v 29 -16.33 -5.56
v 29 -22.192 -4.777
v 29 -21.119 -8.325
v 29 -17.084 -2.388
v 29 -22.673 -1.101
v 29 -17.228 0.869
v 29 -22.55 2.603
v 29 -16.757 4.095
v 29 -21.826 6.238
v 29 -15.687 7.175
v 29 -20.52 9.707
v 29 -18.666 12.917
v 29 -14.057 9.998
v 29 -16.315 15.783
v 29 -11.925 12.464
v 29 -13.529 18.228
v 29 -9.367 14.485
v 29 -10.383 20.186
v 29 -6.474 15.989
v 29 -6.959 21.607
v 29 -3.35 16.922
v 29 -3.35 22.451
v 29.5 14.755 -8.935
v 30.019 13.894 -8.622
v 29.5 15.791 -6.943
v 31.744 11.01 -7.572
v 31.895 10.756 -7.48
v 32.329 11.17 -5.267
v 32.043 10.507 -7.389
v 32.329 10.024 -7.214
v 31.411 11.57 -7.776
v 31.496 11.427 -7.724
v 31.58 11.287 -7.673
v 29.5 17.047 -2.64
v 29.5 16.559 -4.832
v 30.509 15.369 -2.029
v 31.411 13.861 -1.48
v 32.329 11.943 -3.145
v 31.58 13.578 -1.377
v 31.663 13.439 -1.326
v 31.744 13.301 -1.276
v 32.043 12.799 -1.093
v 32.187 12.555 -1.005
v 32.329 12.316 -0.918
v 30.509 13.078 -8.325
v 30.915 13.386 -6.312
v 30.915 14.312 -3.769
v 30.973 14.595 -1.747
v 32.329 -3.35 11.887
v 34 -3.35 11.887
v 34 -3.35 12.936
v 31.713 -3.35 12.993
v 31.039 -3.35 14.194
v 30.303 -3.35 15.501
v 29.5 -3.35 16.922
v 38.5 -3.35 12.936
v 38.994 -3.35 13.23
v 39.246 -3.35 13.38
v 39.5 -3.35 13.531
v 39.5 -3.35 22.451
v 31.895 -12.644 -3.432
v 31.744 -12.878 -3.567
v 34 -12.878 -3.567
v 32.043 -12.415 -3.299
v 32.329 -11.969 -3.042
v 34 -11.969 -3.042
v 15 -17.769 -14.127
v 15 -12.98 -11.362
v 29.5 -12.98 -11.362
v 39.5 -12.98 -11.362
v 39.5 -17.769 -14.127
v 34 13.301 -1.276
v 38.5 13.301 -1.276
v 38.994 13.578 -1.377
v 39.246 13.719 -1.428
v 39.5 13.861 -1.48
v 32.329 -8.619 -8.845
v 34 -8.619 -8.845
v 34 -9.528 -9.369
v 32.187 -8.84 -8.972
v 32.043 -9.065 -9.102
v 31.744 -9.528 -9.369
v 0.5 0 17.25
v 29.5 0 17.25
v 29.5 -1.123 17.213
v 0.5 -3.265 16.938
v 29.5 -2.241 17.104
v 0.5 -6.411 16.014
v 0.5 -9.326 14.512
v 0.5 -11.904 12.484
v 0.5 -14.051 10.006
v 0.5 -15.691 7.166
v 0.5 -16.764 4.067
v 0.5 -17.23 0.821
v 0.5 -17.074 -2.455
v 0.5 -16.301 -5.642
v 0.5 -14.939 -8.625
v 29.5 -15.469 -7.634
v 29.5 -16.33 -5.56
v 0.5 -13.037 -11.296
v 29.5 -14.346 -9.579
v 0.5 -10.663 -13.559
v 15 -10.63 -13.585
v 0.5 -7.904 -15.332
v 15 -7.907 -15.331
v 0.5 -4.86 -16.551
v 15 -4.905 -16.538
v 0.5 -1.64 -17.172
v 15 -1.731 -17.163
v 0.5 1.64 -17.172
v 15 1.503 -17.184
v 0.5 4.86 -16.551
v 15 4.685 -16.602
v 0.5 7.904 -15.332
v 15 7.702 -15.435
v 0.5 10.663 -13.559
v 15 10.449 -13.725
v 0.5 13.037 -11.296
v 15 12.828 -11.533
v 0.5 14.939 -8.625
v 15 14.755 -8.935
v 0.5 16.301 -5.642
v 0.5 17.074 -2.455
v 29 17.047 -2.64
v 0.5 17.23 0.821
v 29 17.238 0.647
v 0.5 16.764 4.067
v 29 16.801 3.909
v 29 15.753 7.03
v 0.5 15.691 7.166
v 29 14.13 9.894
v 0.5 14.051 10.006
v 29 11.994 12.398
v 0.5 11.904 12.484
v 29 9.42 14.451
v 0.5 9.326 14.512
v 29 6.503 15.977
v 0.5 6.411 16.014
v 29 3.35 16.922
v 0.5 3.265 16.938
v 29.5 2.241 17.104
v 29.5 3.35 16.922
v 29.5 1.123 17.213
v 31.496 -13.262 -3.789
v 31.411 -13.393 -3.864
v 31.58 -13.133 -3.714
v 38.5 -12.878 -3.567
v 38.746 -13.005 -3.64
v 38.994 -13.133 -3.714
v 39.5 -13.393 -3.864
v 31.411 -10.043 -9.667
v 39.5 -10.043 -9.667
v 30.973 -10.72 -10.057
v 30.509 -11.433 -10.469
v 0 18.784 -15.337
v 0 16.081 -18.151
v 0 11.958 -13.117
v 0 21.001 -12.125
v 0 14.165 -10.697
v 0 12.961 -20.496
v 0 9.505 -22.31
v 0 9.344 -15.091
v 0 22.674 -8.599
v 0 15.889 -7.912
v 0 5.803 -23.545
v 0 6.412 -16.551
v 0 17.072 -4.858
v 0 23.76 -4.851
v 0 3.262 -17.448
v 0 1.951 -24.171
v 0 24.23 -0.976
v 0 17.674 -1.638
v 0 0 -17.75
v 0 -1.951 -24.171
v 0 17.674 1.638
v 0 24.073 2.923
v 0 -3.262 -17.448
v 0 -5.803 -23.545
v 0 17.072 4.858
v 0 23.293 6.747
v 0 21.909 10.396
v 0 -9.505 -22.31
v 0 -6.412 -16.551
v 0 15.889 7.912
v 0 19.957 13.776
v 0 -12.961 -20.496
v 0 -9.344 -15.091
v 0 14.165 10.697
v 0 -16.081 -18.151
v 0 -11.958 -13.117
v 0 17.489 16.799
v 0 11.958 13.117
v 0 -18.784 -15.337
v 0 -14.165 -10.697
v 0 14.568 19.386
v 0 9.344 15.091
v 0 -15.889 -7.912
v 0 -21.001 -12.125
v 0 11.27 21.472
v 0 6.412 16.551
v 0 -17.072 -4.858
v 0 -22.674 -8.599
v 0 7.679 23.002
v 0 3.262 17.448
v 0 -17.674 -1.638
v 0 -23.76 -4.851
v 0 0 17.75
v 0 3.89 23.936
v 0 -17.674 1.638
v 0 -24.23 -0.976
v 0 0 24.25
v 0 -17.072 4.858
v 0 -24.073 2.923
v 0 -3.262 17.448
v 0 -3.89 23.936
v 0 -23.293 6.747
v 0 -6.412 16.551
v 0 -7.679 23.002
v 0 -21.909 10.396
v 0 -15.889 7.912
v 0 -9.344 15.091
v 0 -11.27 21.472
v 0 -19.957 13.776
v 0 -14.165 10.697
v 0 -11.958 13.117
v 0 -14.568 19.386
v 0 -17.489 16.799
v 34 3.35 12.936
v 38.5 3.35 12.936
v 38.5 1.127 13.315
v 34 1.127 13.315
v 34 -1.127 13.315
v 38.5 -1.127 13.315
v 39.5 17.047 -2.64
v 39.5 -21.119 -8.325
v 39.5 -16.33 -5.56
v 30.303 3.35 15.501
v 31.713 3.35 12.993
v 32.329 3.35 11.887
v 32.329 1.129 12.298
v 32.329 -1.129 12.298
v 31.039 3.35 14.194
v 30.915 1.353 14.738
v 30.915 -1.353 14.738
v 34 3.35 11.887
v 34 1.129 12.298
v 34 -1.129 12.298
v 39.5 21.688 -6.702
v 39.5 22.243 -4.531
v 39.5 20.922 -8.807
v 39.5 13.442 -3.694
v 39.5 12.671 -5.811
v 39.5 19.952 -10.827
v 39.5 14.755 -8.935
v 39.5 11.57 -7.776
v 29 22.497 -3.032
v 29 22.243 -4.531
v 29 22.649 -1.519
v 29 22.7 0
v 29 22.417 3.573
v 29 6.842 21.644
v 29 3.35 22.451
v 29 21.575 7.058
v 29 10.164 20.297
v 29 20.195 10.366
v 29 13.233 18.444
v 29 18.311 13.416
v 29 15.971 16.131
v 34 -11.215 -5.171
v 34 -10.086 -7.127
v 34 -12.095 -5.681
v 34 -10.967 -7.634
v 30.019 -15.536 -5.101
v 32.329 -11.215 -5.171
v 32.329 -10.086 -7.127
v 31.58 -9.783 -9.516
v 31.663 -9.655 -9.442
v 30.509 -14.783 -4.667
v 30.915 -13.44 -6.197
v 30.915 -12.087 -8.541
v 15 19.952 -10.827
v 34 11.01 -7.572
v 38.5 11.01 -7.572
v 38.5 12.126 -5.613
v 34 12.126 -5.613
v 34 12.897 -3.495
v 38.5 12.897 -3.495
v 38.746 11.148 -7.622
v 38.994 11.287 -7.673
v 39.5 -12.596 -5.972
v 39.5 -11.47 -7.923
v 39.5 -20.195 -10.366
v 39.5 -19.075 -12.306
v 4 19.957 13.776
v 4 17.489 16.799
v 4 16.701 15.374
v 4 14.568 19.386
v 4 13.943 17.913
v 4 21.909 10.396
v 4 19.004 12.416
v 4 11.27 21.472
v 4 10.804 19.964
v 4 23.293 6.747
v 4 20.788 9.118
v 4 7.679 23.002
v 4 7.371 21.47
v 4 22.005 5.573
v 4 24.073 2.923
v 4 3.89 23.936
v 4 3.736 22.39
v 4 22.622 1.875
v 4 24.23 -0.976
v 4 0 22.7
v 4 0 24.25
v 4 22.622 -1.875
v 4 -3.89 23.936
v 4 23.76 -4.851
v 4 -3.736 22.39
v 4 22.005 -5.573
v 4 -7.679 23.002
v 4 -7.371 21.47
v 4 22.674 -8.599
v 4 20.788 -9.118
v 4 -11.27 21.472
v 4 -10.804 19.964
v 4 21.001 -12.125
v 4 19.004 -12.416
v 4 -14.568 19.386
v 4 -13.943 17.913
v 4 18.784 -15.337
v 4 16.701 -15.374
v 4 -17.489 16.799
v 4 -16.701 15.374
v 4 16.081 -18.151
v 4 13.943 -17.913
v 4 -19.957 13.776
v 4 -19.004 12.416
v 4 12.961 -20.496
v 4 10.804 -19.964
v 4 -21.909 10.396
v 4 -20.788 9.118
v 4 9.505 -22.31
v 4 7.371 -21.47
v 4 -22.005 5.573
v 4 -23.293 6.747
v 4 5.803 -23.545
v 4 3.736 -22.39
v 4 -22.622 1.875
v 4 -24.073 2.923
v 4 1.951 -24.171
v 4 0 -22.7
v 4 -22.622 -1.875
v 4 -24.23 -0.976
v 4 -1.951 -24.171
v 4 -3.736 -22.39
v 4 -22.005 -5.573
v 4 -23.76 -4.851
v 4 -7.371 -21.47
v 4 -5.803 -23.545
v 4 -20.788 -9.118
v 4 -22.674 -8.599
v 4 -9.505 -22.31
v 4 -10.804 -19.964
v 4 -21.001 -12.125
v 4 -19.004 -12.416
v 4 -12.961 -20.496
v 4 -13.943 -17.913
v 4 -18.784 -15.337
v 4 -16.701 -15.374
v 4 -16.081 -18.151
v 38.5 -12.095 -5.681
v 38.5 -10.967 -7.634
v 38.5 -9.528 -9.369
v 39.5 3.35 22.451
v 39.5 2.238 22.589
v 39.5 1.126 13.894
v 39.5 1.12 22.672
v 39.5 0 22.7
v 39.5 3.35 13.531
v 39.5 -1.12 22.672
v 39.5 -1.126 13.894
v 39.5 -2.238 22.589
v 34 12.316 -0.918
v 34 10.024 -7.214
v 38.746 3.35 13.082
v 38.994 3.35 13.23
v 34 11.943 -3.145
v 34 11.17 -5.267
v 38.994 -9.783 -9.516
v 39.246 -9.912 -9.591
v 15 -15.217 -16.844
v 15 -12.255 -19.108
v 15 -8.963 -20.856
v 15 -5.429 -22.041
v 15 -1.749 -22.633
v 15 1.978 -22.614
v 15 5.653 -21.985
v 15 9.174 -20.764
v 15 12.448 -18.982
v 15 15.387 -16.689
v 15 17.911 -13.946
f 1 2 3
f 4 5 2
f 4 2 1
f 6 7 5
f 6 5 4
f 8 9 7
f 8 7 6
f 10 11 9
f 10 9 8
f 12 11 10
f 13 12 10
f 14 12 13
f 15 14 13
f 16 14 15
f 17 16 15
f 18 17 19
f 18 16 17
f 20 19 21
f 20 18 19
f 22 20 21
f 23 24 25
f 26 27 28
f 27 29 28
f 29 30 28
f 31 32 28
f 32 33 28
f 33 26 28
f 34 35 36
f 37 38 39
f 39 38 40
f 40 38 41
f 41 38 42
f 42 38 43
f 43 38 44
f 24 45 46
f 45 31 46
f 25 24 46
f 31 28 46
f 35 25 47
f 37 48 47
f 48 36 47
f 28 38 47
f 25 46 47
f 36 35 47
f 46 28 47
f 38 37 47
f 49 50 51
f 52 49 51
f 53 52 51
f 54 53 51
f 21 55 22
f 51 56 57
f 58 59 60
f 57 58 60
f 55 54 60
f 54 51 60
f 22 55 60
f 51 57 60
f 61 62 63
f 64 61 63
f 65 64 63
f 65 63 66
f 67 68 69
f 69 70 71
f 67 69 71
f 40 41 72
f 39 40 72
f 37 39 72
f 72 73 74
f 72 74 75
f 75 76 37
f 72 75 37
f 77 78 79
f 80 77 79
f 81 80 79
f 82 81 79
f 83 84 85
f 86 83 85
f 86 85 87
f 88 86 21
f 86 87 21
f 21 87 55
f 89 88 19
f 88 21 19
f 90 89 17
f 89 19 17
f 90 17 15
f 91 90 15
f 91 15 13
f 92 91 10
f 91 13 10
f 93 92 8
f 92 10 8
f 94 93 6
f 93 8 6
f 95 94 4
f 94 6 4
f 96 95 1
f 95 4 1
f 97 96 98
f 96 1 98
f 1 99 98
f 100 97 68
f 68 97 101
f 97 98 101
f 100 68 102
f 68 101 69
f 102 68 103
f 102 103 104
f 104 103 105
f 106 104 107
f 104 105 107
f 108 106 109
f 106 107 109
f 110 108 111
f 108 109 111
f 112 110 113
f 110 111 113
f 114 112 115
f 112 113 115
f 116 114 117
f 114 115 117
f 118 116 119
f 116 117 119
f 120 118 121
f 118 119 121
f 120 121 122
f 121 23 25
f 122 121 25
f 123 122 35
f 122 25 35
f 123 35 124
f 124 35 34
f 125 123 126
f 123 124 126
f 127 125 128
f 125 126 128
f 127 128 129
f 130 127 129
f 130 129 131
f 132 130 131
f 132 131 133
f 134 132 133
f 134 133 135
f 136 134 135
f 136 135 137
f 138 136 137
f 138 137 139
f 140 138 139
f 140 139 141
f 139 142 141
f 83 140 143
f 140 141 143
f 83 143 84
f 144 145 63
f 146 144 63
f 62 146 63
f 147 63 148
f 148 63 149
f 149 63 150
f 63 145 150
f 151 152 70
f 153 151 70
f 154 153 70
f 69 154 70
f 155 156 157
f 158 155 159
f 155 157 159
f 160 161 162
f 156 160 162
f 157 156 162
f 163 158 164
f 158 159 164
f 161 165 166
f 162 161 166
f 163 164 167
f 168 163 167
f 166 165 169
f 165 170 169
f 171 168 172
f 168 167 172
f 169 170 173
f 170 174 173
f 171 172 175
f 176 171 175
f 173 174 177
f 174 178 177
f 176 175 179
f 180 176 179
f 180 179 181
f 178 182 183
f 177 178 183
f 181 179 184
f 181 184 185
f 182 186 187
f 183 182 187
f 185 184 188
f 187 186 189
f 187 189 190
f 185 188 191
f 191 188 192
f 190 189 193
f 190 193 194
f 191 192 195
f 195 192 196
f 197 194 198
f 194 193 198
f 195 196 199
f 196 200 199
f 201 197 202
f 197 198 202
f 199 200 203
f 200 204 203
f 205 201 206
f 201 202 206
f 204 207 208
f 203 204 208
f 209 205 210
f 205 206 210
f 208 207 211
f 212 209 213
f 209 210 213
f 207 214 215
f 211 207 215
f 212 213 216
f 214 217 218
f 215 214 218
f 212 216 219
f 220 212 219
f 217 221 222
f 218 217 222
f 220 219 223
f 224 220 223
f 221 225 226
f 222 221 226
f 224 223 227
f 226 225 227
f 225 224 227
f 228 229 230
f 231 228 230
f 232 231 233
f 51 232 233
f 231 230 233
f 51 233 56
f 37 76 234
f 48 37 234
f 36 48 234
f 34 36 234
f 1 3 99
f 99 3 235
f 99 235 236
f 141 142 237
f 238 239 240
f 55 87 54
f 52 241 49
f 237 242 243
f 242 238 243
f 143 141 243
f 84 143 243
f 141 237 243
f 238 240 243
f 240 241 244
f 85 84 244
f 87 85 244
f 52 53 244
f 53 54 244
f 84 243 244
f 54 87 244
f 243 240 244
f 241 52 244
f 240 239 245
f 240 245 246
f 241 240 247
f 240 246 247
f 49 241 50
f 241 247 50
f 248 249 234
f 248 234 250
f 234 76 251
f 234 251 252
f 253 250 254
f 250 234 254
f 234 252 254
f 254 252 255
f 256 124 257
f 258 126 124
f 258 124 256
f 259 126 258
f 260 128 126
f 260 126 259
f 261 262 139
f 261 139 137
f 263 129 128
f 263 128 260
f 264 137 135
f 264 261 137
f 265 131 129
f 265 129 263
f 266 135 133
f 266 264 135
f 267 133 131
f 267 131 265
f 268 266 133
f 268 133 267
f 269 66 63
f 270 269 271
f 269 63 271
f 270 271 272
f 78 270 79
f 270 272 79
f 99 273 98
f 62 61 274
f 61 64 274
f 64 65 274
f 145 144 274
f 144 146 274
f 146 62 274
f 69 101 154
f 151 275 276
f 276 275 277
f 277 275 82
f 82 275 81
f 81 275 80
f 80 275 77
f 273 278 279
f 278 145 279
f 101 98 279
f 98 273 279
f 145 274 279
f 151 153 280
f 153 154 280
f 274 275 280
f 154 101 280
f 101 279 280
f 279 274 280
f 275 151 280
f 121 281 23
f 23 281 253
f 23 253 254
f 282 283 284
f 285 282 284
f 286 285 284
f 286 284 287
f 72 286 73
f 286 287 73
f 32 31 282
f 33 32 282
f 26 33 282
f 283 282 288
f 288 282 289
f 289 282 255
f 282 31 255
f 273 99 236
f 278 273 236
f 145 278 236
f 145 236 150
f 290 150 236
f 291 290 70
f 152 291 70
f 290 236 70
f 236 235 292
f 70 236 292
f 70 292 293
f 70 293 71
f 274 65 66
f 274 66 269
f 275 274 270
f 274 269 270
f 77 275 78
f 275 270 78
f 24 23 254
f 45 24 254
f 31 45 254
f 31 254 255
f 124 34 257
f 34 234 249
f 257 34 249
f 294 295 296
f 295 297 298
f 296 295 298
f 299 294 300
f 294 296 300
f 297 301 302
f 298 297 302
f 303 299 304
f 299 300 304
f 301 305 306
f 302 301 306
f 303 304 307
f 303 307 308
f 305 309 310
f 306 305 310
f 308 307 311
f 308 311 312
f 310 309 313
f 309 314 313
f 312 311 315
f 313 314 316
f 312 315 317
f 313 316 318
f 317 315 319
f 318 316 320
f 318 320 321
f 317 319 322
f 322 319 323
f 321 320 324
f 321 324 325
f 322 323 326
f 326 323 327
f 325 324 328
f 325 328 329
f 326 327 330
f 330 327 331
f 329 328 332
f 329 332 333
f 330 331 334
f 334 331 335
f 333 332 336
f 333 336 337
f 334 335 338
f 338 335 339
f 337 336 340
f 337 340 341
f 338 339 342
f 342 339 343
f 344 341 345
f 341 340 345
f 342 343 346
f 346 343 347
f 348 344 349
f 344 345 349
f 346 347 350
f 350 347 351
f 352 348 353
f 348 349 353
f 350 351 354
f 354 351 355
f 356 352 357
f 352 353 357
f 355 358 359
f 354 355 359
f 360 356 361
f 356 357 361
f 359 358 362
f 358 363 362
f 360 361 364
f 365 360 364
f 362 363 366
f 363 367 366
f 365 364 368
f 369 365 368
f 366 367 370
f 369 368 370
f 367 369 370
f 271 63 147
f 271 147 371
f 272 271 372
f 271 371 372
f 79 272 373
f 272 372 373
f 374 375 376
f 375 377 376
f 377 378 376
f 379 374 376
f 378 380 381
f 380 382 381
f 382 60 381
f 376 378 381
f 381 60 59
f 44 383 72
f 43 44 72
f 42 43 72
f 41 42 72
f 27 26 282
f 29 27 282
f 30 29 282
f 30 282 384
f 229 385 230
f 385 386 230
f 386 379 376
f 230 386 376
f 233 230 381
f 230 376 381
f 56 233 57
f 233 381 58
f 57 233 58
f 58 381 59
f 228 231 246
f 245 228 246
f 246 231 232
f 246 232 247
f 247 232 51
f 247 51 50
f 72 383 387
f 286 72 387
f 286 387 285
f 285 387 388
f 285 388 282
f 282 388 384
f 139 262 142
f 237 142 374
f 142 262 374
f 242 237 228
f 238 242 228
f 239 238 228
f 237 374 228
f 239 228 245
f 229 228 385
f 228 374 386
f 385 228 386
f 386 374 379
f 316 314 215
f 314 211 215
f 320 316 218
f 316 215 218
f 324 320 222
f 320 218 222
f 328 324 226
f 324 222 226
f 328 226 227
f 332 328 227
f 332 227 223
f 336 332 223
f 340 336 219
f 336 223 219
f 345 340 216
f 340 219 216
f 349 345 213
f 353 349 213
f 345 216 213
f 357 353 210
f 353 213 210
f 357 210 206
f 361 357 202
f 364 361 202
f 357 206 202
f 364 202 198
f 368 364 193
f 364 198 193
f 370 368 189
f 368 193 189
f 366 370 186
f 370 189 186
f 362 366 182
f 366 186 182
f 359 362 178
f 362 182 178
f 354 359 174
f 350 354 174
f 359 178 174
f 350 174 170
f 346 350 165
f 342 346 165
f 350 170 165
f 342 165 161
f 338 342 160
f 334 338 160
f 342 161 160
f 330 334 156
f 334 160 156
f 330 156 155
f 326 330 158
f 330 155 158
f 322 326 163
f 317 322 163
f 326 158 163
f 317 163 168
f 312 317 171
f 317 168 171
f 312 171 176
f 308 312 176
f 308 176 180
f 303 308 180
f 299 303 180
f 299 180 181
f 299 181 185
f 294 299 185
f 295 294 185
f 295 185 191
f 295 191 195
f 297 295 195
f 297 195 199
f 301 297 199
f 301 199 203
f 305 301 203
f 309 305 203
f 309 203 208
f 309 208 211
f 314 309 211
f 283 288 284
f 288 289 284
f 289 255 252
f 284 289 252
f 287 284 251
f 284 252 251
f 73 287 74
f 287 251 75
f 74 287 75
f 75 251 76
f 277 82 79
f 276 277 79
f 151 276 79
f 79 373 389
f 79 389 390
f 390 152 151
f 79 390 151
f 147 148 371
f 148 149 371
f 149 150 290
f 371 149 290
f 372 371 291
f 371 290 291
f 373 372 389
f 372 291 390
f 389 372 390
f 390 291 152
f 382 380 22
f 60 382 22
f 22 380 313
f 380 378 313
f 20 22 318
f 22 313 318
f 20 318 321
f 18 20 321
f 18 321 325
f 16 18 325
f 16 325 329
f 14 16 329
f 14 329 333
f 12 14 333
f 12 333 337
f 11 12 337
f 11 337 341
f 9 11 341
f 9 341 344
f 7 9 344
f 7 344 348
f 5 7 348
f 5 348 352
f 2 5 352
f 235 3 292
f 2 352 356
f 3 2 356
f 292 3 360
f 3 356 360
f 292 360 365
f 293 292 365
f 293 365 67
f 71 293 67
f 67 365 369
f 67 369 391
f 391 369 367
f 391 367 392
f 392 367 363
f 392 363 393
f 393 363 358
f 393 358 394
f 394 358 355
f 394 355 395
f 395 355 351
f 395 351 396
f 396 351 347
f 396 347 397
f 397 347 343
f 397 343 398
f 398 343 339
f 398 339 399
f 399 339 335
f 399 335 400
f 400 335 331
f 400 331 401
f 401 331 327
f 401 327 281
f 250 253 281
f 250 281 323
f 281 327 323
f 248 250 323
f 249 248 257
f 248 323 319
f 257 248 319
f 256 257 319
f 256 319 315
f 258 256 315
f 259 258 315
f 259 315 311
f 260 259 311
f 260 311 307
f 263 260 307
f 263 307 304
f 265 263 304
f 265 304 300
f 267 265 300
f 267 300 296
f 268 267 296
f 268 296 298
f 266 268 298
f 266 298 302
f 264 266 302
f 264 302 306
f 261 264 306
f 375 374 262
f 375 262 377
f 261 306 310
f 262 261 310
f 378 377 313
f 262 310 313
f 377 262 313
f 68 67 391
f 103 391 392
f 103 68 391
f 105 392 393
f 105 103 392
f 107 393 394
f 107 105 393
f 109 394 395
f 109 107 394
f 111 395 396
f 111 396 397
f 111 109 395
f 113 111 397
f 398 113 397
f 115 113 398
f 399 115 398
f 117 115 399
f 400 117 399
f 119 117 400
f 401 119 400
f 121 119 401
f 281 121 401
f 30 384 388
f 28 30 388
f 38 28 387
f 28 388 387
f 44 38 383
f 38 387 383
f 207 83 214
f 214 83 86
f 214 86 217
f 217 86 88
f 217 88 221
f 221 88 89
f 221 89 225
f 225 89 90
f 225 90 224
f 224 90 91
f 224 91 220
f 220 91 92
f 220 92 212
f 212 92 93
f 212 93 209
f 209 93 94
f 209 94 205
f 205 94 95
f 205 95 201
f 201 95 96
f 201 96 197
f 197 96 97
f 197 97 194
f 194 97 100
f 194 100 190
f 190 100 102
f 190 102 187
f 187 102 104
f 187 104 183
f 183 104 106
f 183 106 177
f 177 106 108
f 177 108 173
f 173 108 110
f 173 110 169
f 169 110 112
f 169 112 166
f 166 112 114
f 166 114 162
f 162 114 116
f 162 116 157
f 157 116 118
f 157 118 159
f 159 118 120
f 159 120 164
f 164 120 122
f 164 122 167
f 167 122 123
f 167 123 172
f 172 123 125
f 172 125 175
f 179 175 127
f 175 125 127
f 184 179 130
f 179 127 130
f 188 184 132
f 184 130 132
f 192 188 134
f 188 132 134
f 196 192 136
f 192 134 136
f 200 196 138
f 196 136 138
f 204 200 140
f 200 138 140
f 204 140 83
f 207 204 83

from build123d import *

# Parameters (mm, degrees)
F3_DEPTH = 10.5
F4_DEPTH = 39.501
F5_DEPTH = 24.5
F6_DEPTH = 39.501


with BuildPart() as f1:
    # F0 (on Front) → F1 (revolve)
    with BuildSketch(Plane.XZ):
        Polygon((0, 24.25), (0, 17.75), (0.5, 17.25), (29.5, 17.25), (32.329016319, 12.35), (34, 12.35), (34, 13.3625), (38.5, 13.3625), (39.5, 13.9398502692), (39.5, 22.7), (4, 22.7), (4, 24.25), align=None)
    revolve(axis=Axis((21.5225653753, 0, 0), (1, 0, 0)))

    # F2 (on face) → F3 (cut)
    with BuildSketch(Plane.YZ.offset(39.5)):
        with BuildLine():
            Line((-3.35, 16.9215838502), (-3.35, 22.4514476148))
            ThreePointArc((-3.35, 22.4514476148), (-19.6587766659, 11.35), (-21.1185239862, -8.3245387047))
            Line((-21.1185239862, -8.3245387047), (-16.3295214866, -5.5596068224))
            ThreePointArc((-16.3295214866, -5.5596068224), (-14.9389382153, 8.625), (-3.35, 16.9215838502))
        make_face()
        with BuildLine():
            ThreePointArc((22.7, 0), (17.1949847339, 14.8196659881), (3.35, 22.4514476148))
            Line((3.35, 22.4514476148), (3.35, 16.9215838502))
            ThreePointArc((3.35, 16.9215838502), (14.130372764, 9.8941935271), (17.0468549562, -2.6395522541))
            Line((17.0468549562, -2.6395522541), (22.2432271297, -4.5308770514))
            ThreePointArc((22.2432271297, -4.5308770514), (22.5855181017, -2.2769216231), (22.7, 0))
        make_face()
    extrude(amount=-F3_DEPTH, mode=Mode.SUBTRACT)

    # F2 (on face) → F4 (cut, through all)
    with BuildSketch(Plane.YZ.offset(39.5)):
        with BuildLine():
            Line((-3.35, 13.5313312548), (-3.35, 16.9215838502))
            ThreePointArc((-3.35, 16.9215838502), (-14.9389382153, 8.625), (-16.3295214866, -5.5596068224))
            Line((-16.3295214866, -5.5596068224), (-13.3934766137, -3.8644805247))
            ThreePointArc((-13.3934766137, -3.8644805247), (-12.0722644581, 6.9699251346), (-3.35, 13.5313312548))
        make_face()
        with BuildLine():
            ThreePointArc((17.0468549562, -2.6395522541), (14.130372764, 9.8941935271), (3.35, 16.9215838502))
            Line((3.35, 16.9215838502), (3.35, 13.5313312548))
            ThreePointArc((3.35, 13.5313312548), (10.9776573988, 8.5913016222), (13.9398502692, 0))
            ThreePointArc((13.9398502692, 0), (13.9201386678, -0.7410566766), (13.8610596097, -1.4800175755))
            Line((13.8610596097, -1.4800175755), (17.0468549562, -2.6395522541))
        make_face()
        with BuildLine():
            Line((-3.35, 11.8869676537), (-3.35, 12.9357607527))
            ThreePointArc((-3.35, 12.9357607527), (-11.5722644581, 6.68125), (-12.8776974291, -3.5666952737))
            Line((-12.8776974291, -3.5666952737), (-11.9694159621, -3.0422987242))
            ThreePointArc((-11.9694159621, -3.0422987242), (-10.6954137367, 6.175), (-3.35, 11.8869676537))
        make_face()
        with BuildLine():
            Line((-3.35, 12.9357607527), (-3.35, 13.5313312548))
            ThreePointArc((-3.35, 13.5313312548), (-12.0722644581, 6.9699251346), (-13.3934766137, -3.8644805247))
            Line((-13.3934766137, -3.8644805247), (-12.8776974291, -3.5666952737))
            ThreePointArc((-12.8776974291, -3.5666952737), (-11.5722644581, 6.68125), (-3.35, 12.9357607527))
        make_face()
        with BuildLine():
            ThreePointArc((13.3625, 0), (10.5669480279, 8.1789984488), (3.35, 12.9357607527))
            Line((3.35, 12.9357607527), (3.35, 11.8869676537))
            ThreePointArc((3.35, 11.8869676537), (9.8461921574, 7.4548641839), (12.35, 0))
            ThreePointArc((12.35, 0), (12.3414628662, -0.4591234269), (12.3158632678, -0.917612101))
            Line((12.3158632678, -0.917612101), (13.3014064037, -1.276320467))
            ThreePointArc((13.3014064037, -1.276320467), (13.3472178621, -0.6388909066), (13.3625, 0))
        make_face()
        with BuildLine():
            ThreePointArc((13.9398502692, 0), (10.9776573988, 8.5913016222), (3.35, 13.5313312548))
            Line((3.35, 13.5313312548), (3.35, 12.9357607527))
            ThreePointArc((3.35, 12.9357607527), (10.5669480279, 8.1789984488), (13.3625, 0))
            ThreePointArc((13.3625, 0), (13.3472178621, -0.6388909066), (13.3014064037, -1.276320467))
            Line((13.3014064037, -1.276320467), (13.8610596097, -1.4800175755))
            ThreePointArc((13.8610596097, -1.4800175755), (13.9201386678, -0.7410566766), (13.9398502692, 0))
        make_face()
    extrude(amount=-F4_DEPTH, mode=Mode.SUBTRACT)

    # F2 (on face) → F5 (cut)
    with BuildSketch(Plane.YZ.offset(39.5)):
        with BuildLine():
            Line((-12.9795214866, -11.3619770278), (-17.7685239862, -14.1269089101))
            ThreePointArc((-17.7685239862, -14.1269089101), (1.9784353604, -22.6136196467), (19.9516921694, -10.8268176107))
            Line((19.9516921694, -10.8268176107), (14.7553199959, -8.9354928134))
            ThreePointArc((14.7553199959, -8.9354928134), (1.5034365624, -17.1843585421), (-12.9795214866, -11.3619770278))
        make_face()
    extrude(amount=-F5_DEPTH, mode=Mode.SUBTRACT)

    # F2 (on face) → F6 (cut, through all)
    with BuildSketch(Plane.YZ.offset(39.5)):
        with BuildLine():
            Line((-10.0434766137, -9.6668507301), (-12.9795214866, -11.3619770278))
            ThreePointArc((-12.9795214866, -11.3619770278), (1.5034365624, -17.1843585421), (14.7553199959, -8.9354928134))
            Line((14.7553199959, -8.9354928134), (11.5695246494, -7.7759581348))
            ThreePointArc((11.5695246494, -7.7759581348), (1.214938004, -13.8868049304), (-10.0434766137, -9.6668507301))
        make_face()
        with BuildLine():
            Line((-8.6194159621, -8.8446689295), (-9.5276974291, -9.369065479))
            ThreePointArc((-9.5276974291, -9.369065479), (1.1646186125, -13.3116516533), (11.0098714434, -7.5722610263))
            Line((11.0098714434, -7.5722610263), (10.0243283076, -7.2135526603))
            ThreePointArc((10.0243283076, -7.2135526603), (1.0763734229, -12.3030045214), (-8.6194159621, -8.8446689295))
        make_face()
        with BuildLine():
            Line((-9.5276974291, -9.369065479), (-10.0434766137, -9.6668507301))
            ThreePointArc((-10.0434766137, -9.6668507301), (1.214938004, -13.8868049304), (11.5695246494, -7.7759581348))
            Line((11.5695246494, -7.7759581348), (11.0098714434, -7.5722610263))
            ThreePointArc((11.0098714434, -7.5722610263), (1.1646186125, -13.3116516533), (-9.5276974291, -9.369065479))
        make_face()
    extrude(amount=-F6_DEPTH, mode=Mode.SUBTRACT)


solid = f1.part
